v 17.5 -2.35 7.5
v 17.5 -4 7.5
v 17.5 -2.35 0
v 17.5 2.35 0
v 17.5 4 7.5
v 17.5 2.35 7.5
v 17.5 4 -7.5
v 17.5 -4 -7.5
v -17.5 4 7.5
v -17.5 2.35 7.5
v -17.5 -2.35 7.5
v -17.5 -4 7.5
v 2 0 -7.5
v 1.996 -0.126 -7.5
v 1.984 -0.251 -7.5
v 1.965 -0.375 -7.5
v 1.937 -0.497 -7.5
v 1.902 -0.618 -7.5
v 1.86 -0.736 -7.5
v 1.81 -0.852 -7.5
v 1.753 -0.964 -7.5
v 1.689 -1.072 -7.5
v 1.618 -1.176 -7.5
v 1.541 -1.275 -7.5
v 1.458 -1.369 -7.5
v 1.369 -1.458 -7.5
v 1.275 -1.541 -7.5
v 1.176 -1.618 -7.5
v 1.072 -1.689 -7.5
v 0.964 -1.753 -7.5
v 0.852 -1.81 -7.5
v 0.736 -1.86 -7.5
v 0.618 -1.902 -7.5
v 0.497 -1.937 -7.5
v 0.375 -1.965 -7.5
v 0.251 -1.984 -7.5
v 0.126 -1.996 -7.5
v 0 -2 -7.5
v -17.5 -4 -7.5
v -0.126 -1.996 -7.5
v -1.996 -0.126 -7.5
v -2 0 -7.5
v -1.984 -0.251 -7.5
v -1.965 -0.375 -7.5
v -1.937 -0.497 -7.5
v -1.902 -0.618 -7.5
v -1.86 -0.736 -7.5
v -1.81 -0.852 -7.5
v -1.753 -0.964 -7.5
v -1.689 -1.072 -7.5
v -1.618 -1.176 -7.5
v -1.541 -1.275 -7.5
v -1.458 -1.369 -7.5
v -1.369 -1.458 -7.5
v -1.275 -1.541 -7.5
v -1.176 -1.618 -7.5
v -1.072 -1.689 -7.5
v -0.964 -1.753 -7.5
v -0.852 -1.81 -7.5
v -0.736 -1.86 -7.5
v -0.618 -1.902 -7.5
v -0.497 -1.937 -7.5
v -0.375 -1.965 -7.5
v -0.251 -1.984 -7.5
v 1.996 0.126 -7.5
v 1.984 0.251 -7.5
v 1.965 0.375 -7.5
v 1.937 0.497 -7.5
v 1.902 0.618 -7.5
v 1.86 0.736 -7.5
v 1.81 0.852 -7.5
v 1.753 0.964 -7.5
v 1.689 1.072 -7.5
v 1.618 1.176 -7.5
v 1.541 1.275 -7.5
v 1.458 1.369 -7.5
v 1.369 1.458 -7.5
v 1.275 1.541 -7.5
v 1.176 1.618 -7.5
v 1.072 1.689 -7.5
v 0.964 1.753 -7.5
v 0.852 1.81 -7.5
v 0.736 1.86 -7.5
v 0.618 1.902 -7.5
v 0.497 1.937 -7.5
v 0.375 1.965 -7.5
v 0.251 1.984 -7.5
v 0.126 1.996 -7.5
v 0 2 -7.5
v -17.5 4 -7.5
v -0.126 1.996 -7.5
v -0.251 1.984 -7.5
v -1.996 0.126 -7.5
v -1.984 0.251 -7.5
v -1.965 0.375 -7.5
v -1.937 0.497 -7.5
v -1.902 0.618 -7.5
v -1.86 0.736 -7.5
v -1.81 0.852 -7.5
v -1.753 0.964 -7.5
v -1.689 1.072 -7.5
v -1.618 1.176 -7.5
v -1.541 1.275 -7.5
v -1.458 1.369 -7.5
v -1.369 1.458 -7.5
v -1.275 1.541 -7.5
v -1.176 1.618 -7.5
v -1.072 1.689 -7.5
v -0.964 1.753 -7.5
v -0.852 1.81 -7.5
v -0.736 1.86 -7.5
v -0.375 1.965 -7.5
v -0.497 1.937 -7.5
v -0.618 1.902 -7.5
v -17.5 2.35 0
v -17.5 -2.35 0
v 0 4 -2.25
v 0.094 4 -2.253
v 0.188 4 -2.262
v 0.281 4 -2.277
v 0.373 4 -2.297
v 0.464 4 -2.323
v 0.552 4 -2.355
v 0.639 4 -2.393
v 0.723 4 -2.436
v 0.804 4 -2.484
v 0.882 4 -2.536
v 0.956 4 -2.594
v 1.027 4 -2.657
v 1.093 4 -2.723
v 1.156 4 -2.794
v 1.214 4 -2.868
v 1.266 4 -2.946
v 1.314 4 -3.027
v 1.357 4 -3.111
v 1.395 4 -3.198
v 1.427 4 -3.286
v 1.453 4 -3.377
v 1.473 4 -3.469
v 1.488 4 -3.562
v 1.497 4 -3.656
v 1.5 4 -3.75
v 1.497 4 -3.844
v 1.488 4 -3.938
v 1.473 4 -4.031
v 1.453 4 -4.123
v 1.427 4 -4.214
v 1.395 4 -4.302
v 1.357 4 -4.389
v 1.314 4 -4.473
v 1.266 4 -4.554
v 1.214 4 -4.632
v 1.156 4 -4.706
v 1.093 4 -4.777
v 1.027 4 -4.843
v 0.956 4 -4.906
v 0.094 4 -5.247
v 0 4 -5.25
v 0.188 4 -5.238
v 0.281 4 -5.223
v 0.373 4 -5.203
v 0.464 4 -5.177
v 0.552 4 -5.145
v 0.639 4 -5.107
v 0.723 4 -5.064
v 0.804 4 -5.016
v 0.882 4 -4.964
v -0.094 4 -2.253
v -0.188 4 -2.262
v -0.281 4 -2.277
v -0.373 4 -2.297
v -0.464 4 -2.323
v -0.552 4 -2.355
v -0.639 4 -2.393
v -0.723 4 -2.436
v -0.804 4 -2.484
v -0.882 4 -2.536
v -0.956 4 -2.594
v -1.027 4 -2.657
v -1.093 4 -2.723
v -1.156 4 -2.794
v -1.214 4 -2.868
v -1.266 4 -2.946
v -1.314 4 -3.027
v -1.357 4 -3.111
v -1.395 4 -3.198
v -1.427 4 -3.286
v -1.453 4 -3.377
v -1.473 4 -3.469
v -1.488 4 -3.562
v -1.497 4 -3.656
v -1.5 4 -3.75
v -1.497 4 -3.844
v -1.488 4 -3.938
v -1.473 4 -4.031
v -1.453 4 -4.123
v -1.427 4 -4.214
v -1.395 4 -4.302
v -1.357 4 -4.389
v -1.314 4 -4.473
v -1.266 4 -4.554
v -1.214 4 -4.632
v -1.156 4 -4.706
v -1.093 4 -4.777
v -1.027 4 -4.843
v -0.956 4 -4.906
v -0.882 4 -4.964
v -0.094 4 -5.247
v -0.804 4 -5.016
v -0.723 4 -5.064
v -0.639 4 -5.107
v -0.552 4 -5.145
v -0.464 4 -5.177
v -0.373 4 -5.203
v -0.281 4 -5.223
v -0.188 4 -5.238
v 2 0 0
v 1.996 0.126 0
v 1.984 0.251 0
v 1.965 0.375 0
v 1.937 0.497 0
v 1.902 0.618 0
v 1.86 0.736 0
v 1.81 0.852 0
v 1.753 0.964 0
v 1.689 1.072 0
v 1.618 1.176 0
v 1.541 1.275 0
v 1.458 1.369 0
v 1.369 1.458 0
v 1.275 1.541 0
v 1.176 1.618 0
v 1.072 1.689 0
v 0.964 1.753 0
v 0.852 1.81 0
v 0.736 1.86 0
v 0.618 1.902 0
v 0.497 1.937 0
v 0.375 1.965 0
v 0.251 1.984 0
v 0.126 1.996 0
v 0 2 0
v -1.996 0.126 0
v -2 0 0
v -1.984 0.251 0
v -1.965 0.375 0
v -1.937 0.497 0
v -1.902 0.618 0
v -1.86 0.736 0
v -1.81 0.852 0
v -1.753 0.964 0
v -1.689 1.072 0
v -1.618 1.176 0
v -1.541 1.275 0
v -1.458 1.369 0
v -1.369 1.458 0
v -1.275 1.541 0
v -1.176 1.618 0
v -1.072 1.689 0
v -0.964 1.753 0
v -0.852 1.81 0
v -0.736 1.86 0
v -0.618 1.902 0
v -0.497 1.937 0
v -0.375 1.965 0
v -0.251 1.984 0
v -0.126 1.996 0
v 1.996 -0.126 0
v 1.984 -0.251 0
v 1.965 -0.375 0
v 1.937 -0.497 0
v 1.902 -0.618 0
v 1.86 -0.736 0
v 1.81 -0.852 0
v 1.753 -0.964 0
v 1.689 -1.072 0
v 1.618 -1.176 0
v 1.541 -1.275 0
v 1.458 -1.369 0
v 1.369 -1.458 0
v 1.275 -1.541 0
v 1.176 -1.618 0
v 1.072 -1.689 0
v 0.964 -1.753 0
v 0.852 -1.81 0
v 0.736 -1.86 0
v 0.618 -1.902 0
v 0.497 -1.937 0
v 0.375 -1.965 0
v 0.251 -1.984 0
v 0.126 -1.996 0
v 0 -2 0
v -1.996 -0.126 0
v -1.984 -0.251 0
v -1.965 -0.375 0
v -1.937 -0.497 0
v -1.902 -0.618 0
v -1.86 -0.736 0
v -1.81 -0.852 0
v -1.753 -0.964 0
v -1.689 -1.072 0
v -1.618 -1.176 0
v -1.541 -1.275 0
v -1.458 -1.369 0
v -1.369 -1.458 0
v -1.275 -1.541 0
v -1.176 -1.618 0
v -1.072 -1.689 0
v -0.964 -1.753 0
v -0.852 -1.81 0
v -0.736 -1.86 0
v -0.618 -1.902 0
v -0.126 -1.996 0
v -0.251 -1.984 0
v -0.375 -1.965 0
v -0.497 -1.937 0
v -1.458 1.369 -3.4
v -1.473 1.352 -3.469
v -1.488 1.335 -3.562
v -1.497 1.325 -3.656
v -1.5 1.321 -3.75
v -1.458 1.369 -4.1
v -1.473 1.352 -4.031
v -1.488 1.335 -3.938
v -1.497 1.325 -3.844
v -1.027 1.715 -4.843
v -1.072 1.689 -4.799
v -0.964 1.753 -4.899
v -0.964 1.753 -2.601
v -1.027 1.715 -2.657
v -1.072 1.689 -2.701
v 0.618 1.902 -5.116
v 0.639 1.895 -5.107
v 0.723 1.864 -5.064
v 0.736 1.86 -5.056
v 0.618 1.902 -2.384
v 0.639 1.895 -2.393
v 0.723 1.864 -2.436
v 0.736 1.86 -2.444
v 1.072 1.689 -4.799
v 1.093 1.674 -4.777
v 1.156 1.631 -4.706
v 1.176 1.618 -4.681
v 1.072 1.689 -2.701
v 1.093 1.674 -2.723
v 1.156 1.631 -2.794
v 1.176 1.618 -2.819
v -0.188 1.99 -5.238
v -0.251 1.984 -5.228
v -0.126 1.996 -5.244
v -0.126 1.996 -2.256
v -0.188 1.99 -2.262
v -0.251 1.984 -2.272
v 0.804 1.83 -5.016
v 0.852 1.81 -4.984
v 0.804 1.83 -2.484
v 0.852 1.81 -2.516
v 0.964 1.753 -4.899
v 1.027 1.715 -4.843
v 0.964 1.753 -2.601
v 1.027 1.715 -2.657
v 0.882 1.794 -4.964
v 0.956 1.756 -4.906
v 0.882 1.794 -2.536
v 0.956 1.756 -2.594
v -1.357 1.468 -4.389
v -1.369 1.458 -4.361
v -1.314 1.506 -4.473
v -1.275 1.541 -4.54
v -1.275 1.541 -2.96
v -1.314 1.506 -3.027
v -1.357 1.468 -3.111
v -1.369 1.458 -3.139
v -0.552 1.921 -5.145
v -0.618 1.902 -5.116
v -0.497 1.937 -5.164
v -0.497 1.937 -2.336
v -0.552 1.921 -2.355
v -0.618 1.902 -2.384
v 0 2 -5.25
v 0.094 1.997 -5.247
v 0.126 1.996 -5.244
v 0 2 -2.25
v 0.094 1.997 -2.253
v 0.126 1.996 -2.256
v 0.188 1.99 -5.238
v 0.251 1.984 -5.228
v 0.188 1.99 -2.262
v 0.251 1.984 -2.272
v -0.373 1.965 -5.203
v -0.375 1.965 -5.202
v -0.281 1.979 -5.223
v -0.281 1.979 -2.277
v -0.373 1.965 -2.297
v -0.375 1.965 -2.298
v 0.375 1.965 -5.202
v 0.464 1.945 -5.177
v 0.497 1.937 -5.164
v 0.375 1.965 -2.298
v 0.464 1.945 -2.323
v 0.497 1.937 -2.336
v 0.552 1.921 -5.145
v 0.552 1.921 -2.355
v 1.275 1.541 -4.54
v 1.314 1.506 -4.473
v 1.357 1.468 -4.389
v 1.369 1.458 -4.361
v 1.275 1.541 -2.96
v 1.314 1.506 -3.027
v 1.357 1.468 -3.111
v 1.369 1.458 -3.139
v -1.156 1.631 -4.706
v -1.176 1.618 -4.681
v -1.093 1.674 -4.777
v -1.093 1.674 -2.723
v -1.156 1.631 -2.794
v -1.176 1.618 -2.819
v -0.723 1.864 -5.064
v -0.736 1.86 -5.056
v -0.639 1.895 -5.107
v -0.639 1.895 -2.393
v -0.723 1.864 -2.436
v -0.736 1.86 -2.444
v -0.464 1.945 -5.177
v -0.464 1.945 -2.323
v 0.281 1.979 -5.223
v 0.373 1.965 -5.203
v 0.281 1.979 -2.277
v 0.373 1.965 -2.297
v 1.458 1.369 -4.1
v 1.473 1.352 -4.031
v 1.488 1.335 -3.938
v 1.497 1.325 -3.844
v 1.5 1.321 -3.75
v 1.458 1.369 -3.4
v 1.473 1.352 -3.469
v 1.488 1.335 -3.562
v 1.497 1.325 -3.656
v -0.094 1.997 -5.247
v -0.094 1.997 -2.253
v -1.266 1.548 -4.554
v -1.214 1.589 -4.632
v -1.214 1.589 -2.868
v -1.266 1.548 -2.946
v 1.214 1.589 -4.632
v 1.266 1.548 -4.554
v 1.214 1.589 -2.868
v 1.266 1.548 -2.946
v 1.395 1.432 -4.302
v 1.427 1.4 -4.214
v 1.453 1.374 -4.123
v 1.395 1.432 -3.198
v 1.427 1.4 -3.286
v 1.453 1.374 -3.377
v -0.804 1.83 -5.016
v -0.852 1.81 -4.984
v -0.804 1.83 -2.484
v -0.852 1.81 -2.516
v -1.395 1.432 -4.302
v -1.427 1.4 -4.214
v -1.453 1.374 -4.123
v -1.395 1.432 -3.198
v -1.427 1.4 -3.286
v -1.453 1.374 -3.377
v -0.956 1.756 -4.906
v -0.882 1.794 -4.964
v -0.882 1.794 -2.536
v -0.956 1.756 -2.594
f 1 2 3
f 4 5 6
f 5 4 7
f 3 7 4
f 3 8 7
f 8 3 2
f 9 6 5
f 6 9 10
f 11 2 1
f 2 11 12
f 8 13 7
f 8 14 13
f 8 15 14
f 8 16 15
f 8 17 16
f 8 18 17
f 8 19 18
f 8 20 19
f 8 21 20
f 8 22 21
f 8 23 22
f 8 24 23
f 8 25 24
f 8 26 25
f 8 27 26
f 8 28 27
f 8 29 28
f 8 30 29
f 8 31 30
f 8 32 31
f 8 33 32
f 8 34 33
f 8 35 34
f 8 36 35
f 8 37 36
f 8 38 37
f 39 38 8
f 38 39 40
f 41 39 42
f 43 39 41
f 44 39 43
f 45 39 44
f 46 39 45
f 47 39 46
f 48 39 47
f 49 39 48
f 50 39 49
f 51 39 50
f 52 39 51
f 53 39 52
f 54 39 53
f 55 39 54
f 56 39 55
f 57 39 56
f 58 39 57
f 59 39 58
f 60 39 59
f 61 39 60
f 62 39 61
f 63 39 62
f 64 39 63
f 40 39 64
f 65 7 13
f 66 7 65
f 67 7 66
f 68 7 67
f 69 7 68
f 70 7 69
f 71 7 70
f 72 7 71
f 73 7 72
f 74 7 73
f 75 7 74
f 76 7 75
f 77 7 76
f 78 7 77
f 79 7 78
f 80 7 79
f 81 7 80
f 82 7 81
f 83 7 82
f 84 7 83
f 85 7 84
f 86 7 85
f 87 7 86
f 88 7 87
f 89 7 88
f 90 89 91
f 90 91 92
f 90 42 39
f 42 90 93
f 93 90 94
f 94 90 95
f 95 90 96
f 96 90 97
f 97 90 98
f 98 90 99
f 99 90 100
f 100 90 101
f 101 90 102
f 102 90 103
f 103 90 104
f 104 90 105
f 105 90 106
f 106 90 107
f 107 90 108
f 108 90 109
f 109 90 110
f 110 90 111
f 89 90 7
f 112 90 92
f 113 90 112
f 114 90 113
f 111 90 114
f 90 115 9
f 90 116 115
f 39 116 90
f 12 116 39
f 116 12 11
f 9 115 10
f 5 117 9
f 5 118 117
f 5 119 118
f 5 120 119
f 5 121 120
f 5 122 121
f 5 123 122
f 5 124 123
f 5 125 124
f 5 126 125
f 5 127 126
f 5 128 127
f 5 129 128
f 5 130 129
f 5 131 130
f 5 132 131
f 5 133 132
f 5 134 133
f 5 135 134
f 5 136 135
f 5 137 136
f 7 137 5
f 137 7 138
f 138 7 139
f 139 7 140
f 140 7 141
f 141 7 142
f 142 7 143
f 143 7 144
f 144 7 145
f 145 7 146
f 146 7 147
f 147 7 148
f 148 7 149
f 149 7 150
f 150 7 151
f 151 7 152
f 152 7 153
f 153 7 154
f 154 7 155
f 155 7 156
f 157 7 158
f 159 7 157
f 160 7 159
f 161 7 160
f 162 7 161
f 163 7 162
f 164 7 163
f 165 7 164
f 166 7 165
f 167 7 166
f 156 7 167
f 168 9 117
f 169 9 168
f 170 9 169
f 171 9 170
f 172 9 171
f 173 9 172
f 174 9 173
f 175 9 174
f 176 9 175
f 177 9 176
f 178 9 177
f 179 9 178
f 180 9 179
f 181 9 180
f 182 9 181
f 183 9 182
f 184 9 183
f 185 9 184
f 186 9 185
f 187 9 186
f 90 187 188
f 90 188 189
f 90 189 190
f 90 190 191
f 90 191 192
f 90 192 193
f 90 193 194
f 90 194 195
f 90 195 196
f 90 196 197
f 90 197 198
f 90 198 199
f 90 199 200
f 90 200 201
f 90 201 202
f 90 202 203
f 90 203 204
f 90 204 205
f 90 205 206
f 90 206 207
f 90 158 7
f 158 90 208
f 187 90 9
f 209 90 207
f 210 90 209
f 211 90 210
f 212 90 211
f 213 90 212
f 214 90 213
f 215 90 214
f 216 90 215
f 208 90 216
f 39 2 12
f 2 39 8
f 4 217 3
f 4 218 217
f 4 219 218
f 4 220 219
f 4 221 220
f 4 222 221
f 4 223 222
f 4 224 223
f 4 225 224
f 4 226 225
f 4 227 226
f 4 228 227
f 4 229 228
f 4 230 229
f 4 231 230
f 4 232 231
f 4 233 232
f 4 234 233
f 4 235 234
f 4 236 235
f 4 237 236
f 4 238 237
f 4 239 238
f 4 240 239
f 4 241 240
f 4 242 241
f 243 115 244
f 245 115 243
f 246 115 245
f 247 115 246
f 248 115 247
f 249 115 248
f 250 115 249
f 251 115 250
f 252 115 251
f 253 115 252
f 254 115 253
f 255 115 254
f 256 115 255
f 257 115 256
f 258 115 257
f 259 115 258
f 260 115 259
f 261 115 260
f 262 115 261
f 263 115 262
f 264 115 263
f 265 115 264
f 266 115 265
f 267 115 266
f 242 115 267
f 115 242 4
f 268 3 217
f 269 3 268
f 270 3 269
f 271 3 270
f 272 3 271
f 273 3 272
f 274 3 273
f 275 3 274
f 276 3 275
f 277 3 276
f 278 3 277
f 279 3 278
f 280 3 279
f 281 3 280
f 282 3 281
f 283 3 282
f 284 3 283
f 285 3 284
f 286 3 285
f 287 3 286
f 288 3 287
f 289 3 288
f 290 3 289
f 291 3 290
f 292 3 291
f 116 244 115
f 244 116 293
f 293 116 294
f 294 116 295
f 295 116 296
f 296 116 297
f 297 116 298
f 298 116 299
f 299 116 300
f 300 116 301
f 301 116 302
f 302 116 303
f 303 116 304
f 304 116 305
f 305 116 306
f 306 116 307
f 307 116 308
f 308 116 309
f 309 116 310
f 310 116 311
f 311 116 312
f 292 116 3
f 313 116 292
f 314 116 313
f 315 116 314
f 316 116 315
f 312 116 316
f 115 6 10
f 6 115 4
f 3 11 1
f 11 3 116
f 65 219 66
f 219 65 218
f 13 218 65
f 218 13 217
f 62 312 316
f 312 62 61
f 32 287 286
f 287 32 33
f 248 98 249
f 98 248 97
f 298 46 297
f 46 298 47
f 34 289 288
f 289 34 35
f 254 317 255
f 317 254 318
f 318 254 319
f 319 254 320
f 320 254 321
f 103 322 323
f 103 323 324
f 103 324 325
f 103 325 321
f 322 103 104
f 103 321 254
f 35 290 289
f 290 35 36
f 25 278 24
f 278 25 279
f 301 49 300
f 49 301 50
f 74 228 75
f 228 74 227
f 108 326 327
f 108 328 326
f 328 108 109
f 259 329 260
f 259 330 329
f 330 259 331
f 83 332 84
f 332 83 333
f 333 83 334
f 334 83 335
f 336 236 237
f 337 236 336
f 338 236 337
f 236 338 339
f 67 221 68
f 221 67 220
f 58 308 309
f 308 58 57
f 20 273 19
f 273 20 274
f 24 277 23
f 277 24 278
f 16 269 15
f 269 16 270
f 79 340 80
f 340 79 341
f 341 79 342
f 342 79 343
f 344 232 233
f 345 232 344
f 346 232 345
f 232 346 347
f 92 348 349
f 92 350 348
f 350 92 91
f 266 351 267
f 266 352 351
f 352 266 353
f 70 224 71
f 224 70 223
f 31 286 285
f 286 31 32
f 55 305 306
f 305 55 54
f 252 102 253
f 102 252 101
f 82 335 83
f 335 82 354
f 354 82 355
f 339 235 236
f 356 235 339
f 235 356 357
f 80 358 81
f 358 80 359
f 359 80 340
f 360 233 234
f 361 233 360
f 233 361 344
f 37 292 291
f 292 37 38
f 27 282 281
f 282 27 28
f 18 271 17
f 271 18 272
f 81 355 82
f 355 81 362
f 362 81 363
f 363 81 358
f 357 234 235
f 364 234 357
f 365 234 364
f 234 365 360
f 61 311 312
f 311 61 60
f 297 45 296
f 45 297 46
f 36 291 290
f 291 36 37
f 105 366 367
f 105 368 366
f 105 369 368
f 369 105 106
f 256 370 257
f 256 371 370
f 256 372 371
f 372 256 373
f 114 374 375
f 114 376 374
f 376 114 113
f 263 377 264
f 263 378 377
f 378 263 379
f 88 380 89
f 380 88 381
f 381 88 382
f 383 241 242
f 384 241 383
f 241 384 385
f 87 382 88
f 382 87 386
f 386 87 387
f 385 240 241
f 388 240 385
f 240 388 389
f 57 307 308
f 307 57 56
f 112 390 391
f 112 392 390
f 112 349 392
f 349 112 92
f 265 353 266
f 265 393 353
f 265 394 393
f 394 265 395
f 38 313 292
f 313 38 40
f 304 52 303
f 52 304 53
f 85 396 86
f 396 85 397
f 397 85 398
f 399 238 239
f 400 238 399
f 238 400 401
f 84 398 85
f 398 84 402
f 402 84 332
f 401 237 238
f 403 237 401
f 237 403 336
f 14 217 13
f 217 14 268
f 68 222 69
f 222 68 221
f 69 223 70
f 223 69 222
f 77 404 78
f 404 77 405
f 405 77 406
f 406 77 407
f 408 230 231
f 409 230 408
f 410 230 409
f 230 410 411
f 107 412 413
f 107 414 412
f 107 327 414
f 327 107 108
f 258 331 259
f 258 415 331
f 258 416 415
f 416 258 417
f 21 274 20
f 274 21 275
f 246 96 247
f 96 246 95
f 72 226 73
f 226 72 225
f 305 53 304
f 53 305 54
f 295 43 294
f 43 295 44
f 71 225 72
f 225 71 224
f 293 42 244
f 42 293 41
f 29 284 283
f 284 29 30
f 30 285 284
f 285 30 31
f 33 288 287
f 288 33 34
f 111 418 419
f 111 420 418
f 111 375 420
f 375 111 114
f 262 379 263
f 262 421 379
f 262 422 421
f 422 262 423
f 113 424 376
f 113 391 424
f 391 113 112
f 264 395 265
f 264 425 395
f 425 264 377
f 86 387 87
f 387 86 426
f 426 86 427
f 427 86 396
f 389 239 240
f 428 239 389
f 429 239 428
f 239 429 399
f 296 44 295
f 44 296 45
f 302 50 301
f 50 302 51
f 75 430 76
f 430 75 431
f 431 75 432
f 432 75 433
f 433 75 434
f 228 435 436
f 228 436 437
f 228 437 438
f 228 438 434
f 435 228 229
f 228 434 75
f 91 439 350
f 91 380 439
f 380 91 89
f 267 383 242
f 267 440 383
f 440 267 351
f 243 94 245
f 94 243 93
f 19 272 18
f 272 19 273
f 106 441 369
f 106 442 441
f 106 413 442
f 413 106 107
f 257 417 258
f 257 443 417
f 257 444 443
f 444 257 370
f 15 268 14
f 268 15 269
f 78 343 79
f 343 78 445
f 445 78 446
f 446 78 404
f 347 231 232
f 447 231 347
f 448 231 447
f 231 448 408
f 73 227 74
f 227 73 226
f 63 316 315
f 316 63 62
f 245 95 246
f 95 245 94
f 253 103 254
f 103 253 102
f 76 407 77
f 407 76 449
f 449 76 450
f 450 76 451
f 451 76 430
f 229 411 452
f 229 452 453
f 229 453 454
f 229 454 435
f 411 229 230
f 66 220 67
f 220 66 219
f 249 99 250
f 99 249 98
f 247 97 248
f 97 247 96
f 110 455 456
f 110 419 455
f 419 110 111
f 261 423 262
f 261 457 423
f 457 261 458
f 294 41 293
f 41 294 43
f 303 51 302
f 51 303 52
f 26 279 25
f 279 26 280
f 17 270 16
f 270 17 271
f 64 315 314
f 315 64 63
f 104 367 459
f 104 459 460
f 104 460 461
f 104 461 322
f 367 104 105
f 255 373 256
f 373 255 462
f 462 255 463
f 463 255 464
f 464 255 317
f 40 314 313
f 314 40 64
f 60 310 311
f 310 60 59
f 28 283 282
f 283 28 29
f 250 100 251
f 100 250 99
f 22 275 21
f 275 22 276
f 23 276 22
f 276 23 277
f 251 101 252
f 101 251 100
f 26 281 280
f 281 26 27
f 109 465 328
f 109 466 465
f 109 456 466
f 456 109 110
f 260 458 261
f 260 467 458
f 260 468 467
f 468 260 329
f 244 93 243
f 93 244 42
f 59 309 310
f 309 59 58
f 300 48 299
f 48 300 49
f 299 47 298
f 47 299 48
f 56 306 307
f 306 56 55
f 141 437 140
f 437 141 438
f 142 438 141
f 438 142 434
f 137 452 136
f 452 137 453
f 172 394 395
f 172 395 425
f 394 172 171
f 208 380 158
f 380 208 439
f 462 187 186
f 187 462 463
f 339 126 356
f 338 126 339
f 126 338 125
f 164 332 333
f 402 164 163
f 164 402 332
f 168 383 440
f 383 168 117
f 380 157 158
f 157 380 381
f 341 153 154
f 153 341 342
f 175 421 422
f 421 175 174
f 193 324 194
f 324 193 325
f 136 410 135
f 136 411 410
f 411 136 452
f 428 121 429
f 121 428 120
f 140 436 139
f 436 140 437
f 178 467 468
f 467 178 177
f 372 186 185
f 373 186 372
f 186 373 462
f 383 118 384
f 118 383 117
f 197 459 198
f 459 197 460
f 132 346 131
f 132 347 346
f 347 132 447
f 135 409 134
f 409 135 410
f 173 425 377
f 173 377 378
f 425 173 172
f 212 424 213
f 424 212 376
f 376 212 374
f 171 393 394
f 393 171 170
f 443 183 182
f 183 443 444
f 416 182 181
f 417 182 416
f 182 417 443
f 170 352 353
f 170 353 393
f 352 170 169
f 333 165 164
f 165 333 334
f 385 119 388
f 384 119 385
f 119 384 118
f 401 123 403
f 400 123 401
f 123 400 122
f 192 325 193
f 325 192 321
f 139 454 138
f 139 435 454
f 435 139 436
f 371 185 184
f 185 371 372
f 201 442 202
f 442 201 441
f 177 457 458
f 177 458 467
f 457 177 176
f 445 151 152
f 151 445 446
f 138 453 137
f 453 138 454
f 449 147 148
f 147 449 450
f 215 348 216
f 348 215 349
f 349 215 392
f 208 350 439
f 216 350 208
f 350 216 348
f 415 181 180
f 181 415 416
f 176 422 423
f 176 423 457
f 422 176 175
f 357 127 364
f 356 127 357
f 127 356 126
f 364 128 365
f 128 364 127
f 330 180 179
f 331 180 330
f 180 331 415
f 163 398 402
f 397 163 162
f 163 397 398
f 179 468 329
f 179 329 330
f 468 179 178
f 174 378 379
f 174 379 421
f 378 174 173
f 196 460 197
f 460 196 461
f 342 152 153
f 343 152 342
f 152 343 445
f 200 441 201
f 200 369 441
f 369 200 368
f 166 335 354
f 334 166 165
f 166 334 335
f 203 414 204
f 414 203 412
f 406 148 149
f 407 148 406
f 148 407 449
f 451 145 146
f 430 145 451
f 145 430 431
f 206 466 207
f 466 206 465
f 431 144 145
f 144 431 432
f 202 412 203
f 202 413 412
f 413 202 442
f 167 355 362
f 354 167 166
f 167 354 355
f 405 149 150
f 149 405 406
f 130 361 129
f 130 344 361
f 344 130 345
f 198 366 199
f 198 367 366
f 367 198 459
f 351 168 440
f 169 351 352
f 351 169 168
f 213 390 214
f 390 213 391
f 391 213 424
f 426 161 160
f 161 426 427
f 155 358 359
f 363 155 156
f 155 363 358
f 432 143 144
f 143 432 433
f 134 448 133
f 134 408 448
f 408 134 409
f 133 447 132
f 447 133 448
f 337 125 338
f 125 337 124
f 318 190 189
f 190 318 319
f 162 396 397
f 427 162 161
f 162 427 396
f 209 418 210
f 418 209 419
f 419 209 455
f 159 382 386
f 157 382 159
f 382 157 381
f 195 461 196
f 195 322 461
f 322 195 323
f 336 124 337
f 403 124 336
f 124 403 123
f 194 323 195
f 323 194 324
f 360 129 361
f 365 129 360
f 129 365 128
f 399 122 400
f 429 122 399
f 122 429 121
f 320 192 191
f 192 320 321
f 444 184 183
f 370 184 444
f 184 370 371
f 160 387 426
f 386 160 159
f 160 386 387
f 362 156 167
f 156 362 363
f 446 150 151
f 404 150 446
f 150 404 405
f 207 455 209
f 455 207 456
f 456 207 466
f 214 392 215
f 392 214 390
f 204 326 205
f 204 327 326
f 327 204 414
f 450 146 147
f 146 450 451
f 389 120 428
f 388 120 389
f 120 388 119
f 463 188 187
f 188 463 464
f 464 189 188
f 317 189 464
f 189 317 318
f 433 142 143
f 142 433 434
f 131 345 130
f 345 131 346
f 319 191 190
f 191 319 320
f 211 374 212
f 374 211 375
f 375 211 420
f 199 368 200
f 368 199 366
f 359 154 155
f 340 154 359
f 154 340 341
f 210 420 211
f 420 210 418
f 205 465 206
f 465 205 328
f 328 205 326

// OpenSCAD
$fn=100;

holder_slot_width=4.7;
holder_length=70/2;
holder_width=8;
holder_height=15;

motor_diameter=4;
screw_hole_diameter=3;


difference() {
    cube([holder_length, holder_width, holder_height], center=true);
    translate([0,0,holder_height/2])
    cube([holder_length+1, holder_slot_width, holder_height], center=true);
    cylinder(r=motor_diameter/2, h=holder_height*2, center=true);
    
    translate([0,holder_width/2,-holder_height/4])
    rotate([90,0,0])
    cylinder(r=screw_hole_diameter/2, h=holder_width+1, center=true);
}
